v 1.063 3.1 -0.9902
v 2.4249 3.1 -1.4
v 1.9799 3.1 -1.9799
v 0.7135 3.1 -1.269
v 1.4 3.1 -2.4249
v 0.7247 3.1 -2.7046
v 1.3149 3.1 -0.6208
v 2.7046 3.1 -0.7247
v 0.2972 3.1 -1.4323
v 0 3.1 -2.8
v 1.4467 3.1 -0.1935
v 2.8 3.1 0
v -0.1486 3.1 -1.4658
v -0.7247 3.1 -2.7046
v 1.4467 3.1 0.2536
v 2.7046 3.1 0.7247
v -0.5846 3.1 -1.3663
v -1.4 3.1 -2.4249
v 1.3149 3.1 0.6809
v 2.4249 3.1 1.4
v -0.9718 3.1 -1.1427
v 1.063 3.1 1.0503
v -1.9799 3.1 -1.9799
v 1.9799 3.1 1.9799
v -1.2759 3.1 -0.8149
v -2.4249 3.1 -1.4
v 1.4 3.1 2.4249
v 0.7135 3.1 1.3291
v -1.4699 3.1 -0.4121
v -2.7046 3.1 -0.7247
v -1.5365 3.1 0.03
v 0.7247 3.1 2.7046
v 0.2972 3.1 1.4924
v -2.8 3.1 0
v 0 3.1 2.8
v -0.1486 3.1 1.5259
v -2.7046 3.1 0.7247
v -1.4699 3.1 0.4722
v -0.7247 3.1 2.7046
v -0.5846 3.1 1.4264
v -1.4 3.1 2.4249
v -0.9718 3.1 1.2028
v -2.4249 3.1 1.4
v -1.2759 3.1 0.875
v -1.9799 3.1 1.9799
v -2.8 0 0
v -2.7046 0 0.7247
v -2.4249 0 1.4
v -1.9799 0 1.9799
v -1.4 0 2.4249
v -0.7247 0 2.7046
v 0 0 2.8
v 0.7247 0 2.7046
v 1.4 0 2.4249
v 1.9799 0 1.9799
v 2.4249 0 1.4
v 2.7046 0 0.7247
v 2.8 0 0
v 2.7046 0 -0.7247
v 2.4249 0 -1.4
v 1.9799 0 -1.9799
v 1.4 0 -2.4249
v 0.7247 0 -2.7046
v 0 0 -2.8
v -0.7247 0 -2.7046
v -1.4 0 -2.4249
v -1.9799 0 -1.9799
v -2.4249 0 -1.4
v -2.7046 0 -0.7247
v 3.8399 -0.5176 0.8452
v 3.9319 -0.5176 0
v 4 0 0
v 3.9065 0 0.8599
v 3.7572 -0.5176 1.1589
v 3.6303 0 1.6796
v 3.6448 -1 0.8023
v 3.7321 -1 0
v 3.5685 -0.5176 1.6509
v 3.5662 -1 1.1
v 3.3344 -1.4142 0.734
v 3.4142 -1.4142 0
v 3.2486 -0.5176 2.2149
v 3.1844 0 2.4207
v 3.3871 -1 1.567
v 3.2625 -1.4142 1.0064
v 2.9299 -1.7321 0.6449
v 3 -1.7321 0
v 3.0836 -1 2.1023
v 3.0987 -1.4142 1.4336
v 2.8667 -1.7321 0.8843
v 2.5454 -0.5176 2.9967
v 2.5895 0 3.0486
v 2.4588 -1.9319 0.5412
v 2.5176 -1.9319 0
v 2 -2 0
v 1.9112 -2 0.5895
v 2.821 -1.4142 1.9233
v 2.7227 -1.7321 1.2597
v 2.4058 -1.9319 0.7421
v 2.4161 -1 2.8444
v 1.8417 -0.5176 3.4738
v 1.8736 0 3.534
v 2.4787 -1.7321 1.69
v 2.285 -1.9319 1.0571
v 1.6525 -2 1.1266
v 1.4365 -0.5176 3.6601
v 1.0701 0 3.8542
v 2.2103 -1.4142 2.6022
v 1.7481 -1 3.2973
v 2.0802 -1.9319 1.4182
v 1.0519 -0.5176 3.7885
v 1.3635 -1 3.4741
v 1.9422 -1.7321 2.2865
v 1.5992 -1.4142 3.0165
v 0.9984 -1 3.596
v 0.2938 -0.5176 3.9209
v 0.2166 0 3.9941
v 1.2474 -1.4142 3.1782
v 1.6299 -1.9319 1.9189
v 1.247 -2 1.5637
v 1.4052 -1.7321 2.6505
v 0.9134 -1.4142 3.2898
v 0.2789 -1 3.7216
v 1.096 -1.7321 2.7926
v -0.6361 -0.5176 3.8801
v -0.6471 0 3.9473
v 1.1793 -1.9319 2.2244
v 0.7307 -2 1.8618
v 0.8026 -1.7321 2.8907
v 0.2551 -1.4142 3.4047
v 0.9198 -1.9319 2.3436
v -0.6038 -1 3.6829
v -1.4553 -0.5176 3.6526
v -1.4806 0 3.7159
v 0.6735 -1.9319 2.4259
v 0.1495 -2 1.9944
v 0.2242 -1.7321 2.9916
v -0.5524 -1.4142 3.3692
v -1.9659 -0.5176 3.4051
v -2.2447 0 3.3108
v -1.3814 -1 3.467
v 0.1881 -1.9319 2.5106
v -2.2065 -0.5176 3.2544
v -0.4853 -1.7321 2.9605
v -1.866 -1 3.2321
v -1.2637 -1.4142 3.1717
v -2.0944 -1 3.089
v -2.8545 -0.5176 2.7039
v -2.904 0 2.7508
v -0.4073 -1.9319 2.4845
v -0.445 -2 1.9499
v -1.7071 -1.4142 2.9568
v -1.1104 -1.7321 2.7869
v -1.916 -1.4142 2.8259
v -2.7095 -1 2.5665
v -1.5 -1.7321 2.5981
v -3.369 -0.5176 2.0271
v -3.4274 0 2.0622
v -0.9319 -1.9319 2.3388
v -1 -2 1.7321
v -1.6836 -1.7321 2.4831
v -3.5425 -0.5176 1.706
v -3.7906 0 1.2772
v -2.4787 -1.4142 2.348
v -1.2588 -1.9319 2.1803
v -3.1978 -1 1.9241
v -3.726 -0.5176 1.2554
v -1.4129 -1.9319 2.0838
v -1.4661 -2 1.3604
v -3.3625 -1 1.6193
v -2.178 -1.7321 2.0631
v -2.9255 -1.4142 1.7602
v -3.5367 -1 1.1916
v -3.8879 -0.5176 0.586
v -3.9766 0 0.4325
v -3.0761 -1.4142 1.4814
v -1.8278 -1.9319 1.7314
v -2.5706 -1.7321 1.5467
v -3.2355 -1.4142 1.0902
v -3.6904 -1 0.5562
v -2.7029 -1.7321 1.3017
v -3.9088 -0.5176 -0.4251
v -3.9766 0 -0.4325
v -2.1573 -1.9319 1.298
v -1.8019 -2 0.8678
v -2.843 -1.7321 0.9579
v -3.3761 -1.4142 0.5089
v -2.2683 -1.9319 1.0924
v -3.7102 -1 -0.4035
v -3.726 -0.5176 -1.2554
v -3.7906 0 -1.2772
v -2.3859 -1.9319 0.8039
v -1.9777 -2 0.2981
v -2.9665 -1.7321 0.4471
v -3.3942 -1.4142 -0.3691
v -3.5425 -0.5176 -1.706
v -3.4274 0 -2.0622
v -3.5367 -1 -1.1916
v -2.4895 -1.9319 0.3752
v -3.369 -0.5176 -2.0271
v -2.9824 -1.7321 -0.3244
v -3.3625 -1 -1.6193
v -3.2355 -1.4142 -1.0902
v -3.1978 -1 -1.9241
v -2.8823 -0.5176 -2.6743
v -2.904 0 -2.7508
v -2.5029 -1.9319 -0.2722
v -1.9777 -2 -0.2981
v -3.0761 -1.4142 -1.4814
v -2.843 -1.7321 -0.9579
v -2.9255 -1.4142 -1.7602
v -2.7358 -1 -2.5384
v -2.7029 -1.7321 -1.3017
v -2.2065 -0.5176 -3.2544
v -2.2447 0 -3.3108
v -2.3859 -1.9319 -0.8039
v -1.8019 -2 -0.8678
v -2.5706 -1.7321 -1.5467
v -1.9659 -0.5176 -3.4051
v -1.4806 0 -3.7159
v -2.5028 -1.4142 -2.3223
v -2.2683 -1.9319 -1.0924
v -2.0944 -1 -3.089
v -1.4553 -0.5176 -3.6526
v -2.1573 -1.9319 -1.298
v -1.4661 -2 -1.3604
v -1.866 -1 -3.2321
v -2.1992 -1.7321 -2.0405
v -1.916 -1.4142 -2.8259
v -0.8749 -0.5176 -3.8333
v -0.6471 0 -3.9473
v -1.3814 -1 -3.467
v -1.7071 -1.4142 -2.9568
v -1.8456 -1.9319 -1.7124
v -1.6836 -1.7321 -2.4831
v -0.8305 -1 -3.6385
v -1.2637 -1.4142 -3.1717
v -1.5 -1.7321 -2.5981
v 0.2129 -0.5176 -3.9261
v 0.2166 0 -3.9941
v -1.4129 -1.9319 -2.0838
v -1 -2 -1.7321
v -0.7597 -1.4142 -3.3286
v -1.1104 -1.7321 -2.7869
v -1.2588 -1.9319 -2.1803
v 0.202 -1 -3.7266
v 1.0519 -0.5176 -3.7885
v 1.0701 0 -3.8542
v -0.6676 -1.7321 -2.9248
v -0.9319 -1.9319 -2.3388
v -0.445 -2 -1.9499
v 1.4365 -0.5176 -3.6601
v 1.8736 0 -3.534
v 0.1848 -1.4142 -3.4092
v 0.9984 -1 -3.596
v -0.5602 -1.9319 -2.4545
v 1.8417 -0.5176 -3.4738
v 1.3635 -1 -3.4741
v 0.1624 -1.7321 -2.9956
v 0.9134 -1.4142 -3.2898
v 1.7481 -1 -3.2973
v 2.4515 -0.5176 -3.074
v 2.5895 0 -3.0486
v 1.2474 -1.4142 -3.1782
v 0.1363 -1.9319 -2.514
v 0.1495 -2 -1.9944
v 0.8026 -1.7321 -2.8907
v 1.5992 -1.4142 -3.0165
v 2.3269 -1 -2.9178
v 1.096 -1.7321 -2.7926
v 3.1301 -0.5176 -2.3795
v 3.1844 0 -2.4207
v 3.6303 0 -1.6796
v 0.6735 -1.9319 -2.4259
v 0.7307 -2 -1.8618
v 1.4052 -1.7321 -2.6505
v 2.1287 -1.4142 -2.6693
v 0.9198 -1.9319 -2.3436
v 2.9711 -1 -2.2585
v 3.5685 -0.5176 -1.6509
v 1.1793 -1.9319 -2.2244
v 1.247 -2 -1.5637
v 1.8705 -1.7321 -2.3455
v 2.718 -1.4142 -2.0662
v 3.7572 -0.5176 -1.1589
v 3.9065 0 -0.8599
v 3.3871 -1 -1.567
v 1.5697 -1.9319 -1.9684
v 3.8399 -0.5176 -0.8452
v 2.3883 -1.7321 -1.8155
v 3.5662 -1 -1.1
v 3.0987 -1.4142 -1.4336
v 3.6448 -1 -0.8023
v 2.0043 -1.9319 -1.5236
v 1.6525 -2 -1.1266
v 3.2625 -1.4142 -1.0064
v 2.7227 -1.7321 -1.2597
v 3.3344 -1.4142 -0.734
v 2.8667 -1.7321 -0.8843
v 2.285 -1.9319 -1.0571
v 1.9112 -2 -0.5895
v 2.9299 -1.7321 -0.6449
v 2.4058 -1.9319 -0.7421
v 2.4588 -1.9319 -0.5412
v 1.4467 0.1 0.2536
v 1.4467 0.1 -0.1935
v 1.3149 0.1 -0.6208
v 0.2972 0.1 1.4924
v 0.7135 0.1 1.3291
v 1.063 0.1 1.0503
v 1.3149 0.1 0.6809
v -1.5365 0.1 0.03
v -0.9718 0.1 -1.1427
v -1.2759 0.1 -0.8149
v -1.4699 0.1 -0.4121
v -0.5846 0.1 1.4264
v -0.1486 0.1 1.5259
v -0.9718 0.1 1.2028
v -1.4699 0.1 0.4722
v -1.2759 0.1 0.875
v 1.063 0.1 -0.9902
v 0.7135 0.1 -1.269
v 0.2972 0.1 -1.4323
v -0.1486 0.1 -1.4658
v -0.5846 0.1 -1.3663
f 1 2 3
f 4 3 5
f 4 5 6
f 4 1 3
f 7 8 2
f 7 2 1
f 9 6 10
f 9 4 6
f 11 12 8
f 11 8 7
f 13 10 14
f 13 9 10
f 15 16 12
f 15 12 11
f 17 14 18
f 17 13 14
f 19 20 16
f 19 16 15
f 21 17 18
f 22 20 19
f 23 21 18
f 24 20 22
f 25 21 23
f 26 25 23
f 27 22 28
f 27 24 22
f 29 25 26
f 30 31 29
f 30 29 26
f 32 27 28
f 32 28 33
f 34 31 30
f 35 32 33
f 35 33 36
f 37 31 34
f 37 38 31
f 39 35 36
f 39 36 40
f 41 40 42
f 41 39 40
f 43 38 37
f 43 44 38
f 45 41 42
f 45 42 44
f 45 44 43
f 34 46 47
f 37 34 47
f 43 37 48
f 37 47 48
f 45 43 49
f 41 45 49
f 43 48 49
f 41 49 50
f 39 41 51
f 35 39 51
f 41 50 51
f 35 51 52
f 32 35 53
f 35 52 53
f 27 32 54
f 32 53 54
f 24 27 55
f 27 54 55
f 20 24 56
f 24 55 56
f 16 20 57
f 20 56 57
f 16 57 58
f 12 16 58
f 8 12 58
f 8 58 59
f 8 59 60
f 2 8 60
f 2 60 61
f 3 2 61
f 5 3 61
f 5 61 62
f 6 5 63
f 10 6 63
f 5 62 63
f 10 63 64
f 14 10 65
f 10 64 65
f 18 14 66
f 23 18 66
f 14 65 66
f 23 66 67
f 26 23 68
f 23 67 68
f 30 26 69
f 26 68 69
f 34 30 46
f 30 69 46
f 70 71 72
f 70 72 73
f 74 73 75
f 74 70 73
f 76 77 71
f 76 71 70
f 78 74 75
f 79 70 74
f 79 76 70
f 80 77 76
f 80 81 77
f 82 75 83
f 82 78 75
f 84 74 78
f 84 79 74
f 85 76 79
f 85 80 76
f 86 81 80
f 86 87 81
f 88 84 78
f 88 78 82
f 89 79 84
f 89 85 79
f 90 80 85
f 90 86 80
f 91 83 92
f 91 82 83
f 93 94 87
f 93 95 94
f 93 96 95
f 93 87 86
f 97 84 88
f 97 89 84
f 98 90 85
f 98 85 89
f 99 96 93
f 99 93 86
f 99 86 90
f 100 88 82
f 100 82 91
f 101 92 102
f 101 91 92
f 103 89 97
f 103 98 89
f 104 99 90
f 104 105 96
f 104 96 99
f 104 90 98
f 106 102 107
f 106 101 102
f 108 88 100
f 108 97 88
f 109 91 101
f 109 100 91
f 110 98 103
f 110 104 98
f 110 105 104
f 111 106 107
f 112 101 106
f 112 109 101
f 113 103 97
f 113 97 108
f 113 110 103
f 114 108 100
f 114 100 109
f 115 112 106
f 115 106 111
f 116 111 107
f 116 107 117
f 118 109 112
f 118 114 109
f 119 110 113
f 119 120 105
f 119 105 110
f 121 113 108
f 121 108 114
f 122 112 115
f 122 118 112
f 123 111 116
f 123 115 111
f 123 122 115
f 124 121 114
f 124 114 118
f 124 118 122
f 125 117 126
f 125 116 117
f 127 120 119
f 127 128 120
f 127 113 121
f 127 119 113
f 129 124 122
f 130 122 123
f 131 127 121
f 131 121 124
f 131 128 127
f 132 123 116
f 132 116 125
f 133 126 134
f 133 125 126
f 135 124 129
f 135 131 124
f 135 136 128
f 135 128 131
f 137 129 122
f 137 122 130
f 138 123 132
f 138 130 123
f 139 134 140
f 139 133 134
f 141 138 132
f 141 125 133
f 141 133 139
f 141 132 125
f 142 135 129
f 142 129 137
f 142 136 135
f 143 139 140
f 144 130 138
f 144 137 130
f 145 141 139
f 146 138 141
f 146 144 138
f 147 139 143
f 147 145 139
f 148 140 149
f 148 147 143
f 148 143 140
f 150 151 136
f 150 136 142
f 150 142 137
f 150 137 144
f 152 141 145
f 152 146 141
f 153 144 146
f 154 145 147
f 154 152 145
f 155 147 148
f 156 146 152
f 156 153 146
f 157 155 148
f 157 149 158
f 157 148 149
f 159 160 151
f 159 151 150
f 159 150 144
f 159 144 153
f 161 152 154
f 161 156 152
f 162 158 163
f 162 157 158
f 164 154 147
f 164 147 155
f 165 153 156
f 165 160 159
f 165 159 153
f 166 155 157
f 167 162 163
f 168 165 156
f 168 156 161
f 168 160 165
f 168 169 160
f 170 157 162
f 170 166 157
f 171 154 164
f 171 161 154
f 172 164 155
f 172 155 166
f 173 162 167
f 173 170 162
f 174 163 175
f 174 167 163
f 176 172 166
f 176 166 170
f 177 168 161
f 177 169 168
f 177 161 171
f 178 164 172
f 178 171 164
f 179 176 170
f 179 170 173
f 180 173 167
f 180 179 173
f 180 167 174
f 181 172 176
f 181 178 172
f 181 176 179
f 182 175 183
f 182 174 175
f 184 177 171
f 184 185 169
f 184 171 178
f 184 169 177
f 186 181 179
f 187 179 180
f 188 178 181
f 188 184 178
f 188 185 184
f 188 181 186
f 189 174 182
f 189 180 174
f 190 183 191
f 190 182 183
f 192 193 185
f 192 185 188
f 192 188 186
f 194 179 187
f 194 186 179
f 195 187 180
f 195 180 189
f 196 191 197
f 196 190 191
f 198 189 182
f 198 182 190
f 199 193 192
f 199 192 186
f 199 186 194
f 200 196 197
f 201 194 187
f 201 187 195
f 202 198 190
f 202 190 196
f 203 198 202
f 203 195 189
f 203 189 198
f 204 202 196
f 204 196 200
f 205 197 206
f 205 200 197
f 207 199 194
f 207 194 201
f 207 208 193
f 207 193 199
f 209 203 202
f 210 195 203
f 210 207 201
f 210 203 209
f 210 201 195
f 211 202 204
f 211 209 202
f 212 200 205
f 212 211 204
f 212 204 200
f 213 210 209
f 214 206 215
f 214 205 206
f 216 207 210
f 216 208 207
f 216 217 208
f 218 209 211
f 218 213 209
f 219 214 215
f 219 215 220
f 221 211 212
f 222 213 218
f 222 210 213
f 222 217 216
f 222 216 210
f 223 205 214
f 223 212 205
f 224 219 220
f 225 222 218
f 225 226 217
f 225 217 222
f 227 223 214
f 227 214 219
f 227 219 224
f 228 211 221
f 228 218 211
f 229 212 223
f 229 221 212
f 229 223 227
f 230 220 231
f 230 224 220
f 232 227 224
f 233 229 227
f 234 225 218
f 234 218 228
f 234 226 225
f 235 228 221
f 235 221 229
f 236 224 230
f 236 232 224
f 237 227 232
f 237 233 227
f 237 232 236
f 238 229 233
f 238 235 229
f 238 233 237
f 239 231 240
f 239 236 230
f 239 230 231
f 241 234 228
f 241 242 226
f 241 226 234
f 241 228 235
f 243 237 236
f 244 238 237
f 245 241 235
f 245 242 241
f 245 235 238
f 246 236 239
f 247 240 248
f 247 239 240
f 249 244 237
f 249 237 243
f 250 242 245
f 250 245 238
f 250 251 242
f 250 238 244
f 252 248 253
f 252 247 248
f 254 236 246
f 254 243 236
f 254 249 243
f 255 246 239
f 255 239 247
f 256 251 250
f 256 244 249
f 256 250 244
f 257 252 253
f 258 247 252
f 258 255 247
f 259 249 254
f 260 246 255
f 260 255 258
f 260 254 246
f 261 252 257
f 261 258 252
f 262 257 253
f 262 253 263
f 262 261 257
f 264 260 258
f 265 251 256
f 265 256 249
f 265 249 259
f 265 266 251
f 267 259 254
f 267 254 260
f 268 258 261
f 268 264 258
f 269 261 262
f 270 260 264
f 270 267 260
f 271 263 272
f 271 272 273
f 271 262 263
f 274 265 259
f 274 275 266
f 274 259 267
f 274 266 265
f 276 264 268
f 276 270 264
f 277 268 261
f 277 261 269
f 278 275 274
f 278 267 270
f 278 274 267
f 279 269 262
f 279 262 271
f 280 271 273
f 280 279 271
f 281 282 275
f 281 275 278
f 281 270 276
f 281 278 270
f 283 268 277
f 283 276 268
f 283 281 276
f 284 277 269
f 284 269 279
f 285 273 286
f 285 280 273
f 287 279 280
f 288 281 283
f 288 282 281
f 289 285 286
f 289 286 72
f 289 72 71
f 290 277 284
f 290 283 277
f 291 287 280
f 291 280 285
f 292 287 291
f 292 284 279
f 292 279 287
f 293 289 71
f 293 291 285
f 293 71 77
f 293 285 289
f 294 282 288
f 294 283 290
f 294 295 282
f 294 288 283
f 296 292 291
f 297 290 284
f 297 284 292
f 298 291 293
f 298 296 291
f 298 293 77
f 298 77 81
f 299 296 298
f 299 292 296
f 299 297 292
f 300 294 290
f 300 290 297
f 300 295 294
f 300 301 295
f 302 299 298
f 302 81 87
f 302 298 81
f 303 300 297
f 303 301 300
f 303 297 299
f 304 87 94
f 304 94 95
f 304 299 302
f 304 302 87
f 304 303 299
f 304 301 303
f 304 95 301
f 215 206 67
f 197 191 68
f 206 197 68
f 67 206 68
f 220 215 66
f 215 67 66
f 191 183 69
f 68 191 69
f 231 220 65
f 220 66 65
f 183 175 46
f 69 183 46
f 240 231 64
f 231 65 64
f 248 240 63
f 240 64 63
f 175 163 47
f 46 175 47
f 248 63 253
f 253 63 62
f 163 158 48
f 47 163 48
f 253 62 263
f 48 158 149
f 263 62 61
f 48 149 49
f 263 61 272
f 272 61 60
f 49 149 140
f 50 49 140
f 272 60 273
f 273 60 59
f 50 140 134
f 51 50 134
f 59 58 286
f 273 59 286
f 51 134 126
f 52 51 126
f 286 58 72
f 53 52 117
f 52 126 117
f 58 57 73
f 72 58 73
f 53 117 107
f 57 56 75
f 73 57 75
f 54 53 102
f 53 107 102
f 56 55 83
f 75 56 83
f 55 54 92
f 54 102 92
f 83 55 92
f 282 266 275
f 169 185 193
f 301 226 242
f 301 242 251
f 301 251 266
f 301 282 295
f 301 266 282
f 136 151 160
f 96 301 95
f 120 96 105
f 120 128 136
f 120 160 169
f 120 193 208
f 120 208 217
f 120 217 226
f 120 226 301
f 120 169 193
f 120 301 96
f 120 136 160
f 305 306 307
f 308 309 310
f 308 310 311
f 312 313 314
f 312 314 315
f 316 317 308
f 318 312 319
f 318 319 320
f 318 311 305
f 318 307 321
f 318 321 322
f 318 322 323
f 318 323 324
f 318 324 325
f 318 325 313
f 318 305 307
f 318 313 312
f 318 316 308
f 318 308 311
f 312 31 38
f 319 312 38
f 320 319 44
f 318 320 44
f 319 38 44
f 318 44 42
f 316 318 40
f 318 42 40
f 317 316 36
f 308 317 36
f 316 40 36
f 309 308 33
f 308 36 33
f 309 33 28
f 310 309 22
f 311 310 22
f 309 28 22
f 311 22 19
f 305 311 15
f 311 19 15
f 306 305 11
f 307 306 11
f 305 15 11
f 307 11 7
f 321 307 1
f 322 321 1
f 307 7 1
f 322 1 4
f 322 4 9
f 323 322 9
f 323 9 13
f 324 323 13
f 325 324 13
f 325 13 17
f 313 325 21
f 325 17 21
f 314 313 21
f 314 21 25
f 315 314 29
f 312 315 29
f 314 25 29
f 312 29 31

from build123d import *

# Parameters (mm, degrees)
F0_R     = 4
F1_DEPTH = 2
F2_R     = 1.99999
F3_R     = 2.8
F4_DEPTH = 3.1
F5_R     = 1.5
F6_DEPTH = 3


# Not quite as in the source:
# - a fillet or chamfer is up to 0.001 mm smaller than in the source, because OpenCascade refuses the exact size


with BuildPart() as f1:
    # F0 (on Front) → F1 (new body)
    with BuildSketch(Plane.XZ):
        Circle(F0_R)
    extrude(amount=F1_DEPTH)

    # F2 (radius 2 in the source; OpenCascade refuses exactly that, so slightly less here)
    f2_edges = [f1.edges().sort_by_distance(p)[0] for p in [
        (-4, -2, 0),
    ]]
    fillet(f2_edges, radius=F2_R)

    # F3 (on face) → F4 (join)
    with BuildSketch(Plane(origin=(0, 0, 0), x_dir=(-1, 0, 0), z_dir=(0, 1, 0))):
        Circle(F3_R)
    extrude(amount=F4_DEPTH)

    # F5 (on face) → F6 (cut)
    with BuildSketch(Plane(origin=(0, 3.1, 0), x_dir=(-1, 0, 0), z_dir=(0, 1, 0))):
        with Locations((0.0365495689, 0.0300457796)):
            Circle(F5_R)
    extrude(amount=-F6_DEPTH, mode=Mode.SUBTRACT)


solid = f1.part
